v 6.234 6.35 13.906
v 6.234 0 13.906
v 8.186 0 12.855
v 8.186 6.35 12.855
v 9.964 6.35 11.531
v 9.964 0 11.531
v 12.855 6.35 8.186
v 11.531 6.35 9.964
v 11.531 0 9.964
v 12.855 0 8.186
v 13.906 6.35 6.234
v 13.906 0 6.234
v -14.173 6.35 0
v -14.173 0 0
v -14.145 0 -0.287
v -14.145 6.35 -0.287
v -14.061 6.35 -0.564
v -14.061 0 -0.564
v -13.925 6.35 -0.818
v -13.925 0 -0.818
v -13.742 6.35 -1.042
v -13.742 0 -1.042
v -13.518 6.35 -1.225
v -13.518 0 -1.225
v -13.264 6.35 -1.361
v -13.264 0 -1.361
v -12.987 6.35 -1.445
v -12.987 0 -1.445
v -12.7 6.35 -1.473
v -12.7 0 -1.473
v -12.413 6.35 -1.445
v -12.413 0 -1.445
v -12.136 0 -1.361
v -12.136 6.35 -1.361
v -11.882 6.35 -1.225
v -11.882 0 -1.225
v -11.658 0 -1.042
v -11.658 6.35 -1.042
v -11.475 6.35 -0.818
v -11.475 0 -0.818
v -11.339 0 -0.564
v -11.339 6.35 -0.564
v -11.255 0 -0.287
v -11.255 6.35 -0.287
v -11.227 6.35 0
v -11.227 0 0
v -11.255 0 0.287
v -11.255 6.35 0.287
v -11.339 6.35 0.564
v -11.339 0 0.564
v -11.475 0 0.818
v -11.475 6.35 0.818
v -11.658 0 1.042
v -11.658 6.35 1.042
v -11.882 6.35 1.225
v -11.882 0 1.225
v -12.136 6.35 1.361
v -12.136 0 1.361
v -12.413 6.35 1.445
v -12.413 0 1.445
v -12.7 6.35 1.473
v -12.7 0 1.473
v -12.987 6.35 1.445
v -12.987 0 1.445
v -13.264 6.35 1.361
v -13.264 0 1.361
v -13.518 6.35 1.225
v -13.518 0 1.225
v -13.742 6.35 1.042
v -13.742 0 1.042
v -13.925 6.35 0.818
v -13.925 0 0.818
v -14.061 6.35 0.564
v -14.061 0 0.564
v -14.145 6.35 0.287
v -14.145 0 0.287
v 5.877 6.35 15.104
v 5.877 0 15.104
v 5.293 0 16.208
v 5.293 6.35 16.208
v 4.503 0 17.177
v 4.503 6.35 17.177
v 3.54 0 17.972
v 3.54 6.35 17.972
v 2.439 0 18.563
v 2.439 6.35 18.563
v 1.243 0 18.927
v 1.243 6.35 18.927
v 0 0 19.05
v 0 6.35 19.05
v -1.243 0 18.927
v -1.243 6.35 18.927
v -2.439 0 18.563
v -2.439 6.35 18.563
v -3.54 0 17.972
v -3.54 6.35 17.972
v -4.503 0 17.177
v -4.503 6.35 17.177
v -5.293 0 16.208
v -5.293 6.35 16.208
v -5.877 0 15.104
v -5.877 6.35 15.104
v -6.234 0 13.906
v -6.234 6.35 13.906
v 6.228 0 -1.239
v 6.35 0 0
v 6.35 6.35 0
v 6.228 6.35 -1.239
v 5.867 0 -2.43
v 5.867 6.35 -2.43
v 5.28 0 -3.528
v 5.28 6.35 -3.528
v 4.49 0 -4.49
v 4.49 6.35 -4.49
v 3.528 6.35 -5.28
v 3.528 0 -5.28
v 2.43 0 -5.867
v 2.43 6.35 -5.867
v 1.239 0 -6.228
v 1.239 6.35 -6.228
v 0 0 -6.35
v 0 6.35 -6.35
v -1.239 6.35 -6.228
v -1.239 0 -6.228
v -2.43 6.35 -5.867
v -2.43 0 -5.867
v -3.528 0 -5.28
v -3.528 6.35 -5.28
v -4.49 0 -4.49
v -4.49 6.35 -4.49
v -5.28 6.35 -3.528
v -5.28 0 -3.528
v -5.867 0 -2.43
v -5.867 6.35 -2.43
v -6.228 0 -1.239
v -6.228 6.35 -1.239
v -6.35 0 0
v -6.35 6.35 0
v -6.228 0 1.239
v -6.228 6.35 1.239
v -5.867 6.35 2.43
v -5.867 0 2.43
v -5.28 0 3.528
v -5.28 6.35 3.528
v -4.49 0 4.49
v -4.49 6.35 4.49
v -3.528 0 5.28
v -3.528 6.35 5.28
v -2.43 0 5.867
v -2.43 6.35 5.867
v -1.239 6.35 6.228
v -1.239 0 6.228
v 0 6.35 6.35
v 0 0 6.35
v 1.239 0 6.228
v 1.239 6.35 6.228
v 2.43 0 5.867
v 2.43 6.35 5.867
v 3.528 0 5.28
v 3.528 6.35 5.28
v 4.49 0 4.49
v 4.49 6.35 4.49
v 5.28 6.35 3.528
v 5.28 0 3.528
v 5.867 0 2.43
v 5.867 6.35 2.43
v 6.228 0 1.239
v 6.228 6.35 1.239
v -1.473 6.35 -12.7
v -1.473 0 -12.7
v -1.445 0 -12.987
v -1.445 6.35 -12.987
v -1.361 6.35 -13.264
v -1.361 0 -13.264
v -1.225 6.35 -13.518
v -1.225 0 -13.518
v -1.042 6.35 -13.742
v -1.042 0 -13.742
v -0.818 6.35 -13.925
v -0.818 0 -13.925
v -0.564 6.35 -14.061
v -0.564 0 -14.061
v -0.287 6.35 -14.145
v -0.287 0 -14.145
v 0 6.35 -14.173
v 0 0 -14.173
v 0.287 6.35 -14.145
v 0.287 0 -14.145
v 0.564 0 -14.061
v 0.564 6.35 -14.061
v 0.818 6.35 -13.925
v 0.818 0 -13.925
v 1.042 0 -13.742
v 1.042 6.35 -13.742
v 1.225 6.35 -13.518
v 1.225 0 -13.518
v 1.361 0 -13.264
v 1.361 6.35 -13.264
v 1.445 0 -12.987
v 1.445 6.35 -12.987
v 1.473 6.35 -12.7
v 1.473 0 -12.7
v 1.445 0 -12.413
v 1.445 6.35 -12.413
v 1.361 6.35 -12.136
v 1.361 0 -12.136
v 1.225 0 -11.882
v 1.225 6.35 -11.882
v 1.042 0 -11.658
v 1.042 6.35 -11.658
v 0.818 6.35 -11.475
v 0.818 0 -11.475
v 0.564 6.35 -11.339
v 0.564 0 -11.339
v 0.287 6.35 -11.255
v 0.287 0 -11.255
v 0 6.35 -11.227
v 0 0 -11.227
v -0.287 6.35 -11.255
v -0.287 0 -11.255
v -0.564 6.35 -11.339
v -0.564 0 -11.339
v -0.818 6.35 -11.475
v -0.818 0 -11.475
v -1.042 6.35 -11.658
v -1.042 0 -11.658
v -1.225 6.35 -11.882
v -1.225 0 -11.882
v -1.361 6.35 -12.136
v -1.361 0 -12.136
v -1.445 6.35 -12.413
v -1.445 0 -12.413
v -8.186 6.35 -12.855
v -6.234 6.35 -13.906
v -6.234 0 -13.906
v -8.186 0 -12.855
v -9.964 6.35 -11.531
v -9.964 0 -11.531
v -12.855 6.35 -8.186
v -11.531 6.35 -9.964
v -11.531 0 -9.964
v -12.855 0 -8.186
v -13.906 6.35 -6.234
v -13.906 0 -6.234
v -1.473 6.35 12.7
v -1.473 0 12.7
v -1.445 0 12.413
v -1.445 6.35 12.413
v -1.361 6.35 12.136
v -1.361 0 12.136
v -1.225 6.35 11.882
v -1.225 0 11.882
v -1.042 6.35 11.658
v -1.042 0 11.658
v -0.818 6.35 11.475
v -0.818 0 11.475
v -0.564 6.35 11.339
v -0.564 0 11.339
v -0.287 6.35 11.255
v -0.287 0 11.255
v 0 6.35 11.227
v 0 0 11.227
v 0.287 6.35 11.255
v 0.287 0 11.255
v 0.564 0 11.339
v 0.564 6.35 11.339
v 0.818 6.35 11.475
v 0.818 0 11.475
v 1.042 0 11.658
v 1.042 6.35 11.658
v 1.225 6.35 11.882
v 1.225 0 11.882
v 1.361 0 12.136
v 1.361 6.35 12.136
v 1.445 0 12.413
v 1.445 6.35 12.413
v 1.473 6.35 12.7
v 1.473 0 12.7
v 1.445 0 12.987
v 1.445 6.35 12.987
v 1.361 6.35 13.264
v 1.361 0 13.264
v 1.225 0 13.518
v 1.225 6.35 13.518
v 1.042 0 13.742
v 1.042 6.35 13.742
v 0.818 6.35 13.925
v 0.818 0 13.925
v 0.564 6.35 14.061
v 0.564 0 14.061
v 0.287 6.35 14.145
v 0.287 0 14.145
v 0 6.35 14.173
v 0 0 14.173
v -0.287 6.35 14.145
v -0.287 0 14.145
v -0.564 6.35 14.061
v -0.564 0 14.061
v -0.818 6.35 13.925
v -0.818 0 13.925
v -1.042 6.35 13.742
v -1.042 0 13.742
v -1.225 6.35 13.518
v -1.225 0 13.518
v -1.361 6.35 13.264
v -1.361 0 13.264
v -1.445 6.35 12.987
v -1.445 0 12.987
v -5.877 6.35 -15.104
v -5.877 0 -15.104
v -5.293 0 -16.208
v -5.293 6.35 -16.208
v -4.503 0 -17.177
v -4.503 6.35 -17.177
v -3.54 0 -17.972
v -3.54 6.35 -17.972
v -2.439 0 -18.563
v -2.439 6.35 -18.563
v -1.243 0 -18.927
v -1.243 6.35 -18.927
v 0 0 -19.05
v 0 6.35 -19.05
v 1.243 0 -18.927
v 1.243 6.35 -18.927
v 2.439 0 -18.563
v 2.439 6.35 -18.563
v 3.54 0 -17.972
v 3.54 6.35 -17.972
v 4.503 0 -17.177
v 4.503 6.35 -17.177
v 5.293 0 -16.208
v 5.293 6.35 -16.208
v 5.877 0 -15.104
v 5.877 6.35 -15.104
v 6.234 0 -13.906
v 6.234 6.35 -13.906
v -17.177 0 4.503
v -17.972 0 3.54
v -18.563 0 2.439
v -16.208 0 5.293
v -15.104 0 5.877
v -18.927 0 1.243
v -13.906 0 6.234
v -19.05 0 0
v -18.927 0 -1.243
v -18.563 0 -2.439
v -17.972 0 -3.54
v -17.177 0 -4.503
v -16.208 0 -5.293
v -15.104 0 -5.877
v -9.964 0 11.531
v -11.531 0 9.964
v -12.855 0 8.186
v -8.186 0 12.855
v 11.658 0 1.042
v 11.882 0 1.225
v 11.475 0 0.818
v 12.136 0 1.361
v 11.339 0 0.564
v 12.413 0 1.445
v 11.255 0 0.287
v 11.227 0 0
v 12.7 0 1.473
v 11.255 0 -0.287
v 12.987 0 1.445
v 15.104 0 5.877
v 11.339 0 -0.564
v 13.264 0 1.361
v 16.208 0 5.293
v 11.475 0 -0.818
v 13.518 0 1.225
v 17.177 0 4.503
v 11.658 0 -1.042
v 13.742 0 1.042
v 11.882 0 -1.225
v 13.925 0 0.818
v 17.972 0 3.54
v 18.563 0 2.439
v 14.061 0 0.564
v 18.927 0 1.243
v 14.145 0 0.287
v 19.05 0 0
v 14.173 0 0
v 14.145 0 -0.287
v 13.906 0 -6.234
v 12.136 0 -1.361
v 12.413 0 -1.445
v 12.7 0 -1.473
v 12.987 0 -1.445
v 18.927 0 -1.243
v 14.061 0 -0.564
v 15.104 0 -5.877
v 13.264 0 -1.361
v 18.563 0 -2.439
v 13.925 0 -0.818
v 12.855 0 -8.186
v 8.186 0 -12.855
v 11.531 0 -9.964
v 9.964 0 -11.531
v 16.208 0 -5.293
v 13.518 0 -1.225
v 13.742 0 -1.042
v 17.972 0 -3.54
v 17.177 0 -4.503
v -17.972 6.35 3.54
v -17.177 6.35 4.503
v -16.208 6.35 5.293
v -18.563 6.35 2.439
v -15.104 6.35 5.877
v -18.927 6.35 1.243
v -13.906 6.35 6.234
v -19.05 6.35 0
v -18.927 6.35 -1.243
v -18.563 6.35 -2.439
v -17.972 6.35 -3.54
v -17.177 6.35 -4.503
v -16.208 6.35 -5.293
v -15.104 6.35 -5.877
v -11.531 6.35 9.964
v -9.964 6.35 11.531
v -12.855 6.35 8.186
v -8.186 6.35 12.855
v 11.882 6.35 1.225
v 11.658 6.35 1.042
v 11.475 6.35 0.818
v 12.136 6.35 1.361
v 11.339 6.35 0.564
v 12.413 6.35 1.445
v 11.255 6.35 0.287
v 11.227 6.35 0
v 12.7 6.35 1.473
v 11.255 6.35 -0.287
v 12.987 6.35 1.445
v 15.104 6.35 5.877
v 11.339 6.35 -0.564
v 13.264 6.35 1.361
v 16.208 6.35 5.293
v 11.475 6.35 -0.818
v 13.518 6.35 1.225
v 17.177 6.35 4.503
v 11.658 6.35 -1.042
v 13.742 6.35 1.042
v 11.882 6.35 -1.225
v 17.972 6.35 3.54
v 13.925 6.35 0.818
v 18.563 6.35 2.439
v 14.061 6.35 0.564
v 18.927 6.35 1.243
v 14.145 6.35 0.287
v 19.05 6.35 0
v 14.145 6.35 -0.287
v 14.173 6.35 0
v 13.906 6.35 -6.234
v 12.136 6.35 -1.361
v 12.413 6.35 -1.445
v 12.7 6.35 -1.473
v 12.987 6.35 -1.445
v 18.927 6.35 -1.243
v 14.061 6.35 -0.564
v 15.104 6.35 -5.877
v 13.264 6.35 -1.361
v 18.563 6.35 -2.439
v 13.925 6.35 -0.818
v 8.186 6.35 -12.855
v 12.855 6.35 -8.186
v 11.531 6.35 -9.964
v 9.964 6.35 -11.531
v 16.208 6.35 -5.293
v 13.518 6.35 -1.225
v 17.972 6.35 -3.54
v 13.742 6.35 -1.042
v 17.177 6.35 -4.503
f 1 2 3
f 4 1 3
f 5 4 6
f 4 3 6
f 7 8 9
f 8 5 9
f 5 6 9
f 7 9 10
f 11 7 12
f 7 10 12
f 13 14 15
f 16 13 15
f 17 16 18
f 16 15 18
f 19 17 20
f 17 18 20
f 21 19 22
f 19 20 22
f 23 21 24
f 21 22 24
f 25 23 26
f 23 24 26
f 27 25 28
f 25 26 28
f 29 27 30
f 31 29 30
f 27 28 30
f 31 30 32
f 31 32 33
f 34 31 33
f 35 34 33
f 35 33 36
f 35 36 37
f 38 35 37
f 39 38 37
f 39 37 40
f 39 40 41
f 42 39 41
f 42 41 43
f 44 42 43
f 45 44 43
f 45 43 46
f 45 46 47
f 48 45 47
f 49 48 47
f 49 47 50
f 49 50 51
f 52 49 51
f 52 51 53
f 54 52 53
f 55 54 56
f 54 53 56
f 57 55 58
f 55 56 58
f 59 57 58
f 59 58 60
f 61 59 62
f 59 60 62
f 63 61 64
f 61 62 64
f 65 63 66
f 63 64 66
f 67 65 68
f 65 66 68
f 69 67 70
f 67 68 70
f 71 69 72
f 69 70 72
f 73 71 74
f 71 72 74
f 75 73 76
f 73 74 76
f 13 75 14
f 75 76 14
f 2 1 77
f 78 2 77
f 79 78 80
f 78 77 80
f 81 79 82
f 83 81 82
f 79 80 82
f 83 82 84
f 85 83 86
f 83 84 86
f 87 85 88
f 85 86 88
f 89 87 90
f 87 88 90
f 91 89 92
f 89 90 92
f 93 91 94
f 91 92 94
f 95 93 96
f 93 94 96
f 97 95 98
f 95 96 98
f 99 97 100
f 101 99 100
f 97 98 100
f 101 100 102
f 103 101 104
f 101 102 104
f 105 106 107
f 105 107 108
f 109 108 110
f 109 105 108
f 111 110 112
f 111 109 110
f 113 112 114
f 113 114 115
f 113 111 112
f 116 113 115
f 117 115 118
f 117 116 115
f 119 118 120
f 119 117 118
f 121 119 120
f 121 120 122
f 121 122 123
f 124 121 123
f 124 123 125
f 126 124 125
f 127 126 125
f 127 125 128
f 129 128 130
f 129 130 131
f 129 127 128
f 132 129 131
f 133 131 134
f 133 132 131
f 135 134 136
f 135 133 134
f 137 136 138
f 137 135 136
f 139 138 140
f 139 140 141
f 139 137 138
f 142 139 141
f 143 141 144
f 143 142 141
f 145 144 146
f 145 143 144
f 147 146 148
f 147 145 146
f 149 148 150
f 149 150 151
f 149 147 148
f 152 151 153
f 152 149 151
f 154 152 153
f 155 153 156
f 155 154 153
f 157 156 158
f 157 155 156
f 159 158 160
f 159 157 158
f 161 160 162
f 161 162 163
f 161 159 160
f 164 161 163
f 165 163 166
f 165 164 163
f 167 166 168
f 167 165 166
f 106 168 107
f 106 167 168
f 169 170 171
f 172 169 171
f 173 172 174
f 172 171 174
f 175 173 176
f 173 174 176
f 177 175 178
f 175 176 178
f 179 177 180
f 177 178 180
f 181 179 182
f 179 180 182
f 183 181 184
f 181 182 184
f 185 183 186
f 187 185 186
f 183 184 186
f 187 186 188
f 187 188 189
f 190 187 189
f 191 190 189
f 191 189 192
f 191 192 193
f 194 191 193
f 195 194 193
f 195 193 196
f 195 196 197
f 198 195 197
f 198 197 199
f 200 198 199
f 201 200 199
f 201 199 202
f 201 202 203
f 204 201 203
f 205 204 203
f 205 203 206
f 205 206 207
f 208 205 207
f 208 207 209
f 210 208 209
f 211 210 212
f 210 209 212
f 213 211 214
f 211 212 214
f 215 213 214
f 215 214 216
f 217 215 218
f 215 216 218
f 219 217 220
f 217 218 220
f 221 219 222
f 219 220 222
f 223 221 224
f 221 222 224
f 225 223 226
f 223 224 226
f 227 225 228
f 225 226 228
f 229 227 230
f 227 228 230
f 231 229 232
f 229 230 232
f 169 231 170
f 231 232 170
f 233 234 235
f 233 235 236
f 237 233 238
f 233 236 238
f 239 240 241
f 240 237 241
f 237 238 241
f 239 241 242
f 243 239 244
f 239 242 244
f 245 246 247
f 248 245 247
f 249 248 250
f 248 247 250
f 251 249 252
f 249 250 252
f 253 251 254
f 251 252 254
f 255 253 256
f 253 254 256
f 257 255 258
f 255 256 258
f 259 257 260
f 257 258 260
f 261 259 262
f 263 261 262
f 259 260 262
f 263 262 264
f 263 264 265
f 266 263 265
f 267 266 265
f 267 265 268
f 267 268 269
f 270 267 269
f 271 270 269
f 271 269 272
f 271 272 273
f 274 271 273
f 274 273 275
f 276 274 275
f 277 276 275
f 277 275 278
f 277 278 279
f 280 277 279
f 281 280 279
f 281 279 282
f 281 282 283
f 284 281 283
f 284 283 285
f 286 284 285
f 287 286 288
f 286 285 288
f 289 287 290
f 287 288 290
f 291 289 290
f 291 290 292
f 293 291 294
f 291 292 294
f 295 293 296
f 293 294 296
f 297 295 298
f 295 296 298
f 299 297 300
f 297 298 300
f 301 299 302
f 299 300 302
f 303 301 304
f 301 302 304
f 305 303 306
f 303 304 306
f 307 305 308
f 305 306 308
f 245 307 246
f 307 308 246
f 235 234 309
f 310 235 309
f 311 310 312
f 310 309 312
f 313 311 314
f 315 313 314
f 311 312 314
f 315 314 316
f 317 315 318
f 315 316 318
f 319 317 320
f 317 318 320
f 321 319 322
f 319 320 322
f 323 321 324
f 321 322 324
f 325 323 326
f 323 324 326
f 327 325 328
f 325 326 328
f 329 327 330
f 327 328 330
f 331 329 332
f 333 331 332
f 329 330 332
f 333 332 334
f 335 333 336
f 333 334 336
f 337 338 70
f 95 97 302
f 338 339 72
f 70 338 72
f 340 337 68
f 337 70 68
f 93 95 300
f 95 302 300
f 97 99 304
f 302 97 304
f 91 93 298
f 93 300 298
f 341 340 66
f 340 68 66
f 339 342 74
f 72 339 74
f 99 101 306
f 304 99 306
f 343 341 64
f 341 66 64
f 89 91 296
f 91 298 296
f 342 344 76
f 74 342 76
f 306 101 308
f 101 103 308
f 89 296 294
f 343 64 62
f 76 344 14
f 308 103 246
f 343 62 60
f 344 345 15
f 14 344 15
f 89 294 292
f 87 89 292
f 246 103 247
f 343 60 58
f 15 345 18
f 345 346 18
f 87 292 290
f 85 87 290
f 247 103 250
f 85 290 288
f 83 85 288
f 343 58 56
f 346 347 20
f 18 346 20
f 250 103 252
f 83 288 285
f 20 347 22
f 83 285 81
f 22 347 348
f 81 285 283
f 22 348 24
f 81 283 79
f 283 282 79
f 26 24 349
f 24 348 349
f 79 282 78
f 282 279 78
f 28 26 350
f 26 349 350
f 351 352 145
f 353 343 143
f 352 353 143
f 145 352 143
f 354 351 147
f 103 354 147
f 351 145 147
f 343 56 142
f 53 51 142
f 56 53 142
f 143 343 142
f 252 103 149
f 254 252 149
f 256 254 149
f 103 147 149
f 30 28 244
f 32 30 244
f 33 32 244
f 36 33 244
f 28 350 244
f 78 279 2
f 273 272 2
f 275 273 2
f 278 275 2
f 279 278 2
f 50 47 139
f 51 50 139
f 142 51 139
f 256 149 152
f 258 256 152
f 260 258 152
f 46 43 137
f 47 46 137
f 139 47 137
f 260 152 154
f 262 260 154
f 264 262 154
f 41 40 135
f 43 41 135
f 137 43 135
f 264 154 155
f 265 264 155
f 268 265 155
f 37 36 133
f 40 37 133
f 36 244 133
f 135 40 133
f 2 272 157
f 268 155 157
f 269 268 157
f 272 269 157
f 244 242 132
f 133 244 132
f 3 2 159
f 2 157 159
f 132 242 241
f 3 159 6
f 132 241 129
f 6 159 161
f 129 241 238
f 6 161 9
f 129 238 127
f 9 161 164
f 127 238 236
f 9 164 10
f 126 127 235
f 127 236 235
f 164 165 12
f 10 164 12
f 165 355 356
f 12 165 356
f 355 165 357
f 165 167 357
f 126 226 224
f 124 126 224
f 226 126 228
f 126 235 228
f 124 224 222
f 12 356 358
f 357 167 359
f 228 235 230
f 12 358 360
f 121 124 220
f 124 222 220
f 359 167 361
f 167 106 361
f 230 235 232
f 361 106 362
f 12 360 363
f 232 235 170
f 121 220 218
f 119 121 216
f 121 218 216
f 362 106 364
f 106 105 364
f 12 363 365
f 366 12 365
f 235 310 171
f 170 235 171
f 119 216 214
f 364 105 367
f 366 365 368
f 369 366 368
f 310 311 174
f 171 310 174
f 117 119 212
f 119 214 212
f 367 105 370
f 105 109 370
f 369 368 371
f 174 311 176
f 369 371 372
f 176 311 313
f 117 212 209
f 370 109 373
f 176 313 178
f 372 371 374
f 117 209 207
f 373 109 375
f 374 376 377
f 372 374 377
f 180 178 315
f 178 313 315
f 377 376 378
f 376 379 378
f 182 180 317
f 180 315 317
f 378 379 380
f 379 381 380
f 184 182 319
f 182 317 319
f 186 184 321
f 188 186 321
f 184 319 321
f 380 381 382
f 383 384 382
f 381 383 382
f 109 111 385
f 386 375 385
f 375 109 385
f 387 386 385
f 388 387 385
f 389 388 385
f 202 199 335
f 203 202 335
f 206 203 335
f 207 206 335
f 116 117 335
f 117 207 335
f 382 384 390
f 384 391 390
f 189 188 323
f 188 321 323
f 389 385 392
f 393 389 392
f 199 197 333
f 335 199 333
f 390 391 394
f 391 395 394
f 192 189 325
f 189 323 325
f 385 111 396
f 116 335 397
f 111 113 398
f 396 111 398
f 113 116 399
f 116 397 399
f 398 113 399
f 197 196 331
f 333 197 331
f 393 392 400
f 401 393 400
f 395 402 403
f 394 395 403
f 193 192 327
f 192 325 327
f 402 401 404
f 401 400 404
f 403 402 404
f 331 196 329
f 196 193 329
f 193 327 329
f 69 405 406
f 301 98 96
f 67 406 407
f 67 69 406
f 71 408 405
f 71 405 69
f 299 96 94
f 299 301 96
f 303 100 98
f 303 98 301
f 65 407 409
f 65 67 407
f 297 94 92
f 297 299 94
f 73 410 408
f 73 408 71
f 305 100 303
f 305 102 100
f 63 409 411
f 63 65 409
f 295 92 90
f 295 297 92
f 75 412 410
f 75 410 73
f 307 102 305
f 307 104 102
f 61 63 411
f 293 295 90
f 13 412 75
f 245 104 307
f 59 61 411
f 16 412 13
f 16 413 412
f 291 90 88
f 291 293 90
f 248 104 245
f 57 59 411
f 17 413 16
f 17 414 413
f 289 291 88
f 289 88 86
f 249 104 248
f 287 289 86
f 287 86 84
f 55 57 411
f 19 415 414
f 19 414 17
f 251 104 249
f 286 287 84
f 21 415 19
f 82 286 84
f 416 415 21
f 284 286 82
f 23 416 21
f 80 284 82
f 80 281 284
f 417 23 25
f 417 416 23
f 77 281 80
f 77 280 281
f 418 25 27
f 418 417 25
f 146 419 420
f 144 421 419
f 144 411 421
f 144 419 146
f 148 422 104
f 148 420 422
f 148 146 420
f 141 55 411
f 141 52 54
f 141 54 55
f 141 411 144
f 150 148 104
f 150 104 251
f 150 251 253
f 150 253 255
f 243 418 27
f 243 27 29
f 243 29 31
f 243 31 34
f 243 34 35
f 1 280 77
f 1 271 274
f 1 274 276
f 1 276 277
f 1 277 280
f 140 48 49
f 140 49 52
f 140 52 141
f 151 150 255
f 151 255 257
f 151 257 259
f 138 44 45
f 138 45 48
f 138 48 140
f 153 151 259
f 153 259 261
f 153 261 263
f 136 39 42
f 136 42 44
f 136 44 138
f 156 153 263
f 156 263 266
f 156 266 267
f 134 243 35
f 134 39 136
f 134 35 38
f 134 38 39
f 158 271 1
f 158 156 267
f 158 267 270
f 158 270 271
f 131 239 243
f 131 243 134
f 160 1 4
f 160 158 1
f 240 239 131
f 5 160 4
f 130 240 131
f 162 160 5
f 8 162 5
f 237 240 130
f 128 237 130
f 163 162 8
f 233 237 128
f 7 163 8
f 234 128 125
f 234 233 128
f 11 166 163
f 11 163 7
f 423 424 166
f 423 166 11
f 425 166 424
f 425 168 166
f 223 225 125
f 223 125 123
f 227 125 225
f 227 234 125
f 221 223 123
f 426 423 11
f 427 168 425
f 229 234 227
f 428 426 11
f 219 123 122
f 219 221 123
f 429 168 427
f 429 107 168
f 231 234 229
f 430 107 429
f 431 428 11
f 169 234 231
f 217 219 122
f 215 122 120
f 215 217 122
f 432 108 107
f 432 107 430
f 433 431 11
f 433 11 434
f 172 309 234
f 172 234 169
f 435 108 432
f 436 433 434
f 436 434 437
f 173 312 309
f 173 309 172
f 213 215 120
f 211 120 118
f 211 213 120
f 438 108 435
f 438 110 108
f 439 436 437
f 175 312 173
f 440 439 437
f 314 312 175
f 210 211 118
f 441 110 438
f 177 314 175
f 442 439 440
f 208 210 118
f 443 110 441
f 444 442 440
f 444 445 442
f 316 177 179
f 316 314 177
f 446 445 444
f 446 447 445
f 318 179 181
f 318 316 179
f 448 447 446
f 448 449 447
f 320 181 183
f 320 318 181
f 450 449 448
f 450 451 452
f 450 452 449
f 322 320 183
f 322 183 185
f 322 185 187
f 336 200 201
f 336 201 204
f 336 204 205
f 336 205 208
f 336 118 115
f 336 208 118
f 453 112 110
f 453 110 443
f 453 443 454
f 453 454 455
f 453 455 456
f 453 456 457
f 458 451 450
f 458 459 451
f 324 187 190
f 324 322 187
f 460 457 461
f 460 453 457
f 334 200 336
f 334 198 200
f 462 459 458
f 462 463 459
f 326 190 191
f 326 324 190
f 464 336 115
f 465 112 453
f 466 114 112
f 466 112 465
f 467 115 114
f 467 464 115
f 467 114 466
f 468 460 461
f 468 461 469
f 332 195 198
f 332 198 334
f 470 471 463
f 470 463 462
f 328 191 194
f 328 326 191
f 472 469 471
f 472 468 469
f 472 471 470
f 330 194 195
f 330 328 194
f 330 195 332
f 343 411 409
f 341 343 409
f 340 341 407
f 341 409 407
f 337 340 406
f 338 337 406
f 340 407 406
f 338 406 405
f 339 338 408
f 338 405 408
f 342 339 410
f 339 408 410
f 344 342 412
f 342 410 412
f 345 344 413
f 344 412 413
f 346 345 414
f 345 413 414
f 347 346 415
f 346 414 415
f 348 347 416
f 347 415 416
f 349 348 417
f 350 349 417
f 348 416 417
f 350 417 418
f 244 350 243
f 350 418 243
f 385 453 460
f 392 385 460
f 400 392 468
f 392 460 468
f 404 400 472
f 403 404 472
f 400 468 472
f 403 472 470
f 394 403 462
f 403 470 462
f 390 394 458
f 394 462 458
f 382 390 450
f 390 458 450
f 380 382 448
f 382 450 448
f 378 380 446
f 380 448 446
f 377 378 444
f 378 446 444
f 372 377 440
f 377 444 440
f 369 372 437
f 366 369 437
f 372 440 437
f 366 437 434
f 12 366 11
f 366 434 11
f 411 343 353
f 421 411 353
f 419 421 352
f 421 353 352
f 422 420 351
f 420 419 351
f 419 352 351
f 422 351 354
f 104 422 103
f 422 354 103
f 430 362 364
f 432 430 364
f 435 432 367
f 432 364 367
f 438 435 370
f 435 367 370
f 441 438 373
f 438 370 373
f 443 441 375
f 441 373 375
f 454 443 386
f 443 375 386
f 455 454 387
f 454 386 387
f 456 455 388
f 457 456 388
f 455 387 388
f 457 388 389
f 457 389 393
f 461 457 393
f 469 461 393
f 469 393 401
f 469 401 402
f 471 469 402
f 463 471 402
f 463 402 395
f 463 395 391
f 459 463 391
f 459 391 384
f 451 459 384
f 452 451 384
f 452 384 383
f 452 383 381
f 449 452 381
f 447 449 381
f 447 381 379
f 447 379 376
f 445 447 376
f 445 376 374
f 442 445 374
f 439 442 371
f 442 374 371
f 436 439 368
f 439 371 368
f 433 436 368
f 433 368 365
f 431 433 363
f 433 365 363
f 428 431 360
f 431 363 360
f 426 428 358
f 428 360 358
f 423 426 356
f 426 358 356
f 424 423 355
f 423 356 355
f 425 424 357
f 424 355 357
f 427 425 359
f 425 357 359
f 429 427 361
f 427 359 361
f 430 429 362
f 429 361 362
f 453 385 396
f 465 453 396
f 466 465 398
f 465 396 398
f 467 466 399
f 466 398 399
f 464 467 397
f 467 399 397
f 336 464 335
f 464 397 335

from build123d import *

# Parameters (mm, degrees)
SKETCH1_R                 = 15.24
SKETCH1_R_2               = 6.35
BOSS_EXTRUDE1_DEPTH       = 6.35
F_4_CLEARANCE_HOLE1_D     = 2.9464
F_4_CLEARANCE_HOLE1_DEPTH = 6.35
BOSS_EXTRUDE2_DEPTH       = 6.35
CIRPATTERN1_COUNT         = 4


with BuildPart() as part:
    # Sketch1 → Boss-Extrude1 (new body)
    with BuildSketch(Plane(origin=(0, 0, 0), x_dir=(1, 0, 0), z_dir=(0, 1, 0))):
        Circle(SKETCH1_R)
        Circle(SKETCH1_R_2, mode=Mode.SUBTRACT)
    extrude(amount=BOSS_EXTRUDE1_DEPTH)

    # #4 Clearance Hole1
    with Locations(Plane(origin=(-8.015495471, 6.35, -5.066061758), x_dir=(1, 0, 0), z_dir=(0, 1, 0))):
        with Locations((8.015495471, 7.633938242), (-4.684504529, -5.066061758), (20.715495471, -5.066061758), (8.015495471, -17.766061758)):
            Hole(F_4_CLEARANCE_HOLE1_D / 2, depth=F_4_CLEARANCE_HOLE1_DEPTH)

    # Sketch7 → Boss-Extrude2 (add)
    with BuildSketch(Plane(origin=(0, 6.35, 0), x_dir=(1, 0, 0), z_dir=(0, 1, 0))):
        with BuildLine():
            ThreePointArc((-6.234328974, 13.9065), (0, 19.05), (6.234328974, 13.9065))
            ThreePointArc((6.234328974, 13.9065), (0, 15.24), (-6.234328974, 13.9065))
        make_face()
    boss_extrude2 = extrude(amount=-BOSS_EXTRUDE2_DEPTH)

    # CirPattern1: Boss-Extrude2 ×4 about axis
    cirpattern1_axis = Axis((0, 0, 0), (0, 1, 0))
    for i in range(1, CIRPATTERN1_COUNT):
        add(boss_extrude2.rotate(cirpattern1_axis, i * 360 / CIRPATTERN1_COUNT))


solid = part.part
